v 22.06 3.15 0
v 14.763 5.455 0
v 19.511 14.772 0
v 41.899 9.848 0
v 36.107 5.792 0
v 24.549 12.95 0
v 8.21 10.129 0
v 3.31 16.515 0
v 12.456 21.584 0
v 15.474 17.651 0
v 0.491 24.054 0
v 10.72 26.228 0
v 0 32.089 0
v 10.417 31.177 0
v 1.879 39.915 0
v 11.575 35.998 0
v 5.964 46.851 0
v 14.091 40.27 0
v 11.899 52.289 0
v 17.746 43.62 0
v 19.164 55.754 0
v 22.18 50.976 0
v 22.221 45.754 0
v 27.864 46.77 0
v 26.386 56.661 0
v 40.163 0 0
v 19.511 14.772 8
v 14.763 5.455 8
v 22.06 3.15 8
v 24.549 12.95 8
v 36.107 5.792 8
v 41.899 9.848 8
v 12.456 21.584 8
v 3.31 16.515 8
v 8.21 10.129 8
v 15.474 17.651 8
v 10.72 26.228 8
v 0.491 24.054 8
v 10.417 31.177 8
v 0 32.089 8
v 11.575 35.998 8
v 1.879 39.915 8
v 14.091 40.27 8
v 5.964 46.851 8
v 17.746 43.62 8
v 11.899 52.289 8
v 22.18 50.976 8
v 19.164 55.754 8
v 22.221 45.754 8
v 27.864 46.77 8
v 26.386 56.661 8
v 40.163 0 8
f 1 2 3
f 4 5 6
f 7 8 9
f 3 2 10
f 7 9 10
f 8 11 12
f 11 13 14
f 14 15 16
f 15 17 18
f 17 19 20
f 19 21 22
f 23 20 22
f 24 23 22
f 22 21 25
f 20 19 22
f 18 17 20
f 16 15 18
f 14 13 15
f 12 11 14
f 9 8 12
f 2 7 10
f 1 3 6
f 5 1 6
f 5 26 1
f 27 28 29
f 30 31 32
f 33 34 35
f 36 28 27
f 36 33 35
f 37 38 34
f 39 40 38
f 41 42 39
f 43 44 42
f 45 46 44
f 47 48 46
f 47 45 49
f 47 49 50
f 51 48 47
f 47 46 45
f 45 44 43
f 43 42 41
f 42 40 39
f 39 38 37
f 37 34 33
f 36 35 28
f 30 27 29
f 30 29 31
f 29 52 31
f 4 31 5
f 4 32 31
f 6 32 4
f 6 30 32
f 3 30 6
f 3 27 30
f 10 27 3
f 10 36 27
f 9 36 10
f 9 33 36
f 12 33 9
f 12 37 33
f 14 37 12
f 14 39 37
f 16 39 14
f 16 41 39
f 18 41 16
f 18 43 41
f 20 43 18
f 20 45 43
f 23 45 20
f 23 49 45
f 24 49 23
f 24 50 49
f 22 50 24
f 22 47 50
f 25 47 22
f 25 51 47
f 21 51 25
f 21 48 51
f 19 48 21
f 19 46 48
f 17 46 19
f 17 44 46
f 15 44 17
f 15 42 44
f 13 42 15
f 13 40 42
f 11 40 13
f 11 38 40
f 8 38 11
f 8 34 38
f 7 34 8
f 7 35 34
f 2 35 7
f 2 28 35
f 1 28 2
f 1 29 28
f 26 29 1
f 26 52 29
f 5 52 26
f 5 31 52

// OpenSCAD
$fn = 32;

// ----------------------------------------------------------------------
// Hook plate: curl radius 22 mm over 170 degrees, 10 mm thick band
// ----------------------------------------------------------------------

// --- parameters (mm) ---
profile_height = 8;       // extrusion height
profile_points = 26;      // points of the closed outline

profile = [[22.18, 50.976], [26.386, 56.661], [19.164, 55.754], [11.899, 52.289], [5.964, 46.851], [1.879, 39.915], [0, 32.089], [0.491, 24.054], [3.31, 16.515], [8.21, 10.129], [14.763, 5.455], [22.06, 3.15], [40.163, 0], [36.107, 5.792], [41.899, 9.848], [24.549, 12.95], [19.511, 14.772], [15.474, 17.651], [12.456, 21.584], [10.72, 26.228], [10.417, 31.177], [11.575, 35.998], [14.091, 40.27], [17.746, 43.62], [22.221, 45.754], [27.864, 46.77]];  // single closed polygon, 26 points, counter clockwise

// --- the one profile operation ---
linear_extrude(height = profile_height) polygon(points = profile);
